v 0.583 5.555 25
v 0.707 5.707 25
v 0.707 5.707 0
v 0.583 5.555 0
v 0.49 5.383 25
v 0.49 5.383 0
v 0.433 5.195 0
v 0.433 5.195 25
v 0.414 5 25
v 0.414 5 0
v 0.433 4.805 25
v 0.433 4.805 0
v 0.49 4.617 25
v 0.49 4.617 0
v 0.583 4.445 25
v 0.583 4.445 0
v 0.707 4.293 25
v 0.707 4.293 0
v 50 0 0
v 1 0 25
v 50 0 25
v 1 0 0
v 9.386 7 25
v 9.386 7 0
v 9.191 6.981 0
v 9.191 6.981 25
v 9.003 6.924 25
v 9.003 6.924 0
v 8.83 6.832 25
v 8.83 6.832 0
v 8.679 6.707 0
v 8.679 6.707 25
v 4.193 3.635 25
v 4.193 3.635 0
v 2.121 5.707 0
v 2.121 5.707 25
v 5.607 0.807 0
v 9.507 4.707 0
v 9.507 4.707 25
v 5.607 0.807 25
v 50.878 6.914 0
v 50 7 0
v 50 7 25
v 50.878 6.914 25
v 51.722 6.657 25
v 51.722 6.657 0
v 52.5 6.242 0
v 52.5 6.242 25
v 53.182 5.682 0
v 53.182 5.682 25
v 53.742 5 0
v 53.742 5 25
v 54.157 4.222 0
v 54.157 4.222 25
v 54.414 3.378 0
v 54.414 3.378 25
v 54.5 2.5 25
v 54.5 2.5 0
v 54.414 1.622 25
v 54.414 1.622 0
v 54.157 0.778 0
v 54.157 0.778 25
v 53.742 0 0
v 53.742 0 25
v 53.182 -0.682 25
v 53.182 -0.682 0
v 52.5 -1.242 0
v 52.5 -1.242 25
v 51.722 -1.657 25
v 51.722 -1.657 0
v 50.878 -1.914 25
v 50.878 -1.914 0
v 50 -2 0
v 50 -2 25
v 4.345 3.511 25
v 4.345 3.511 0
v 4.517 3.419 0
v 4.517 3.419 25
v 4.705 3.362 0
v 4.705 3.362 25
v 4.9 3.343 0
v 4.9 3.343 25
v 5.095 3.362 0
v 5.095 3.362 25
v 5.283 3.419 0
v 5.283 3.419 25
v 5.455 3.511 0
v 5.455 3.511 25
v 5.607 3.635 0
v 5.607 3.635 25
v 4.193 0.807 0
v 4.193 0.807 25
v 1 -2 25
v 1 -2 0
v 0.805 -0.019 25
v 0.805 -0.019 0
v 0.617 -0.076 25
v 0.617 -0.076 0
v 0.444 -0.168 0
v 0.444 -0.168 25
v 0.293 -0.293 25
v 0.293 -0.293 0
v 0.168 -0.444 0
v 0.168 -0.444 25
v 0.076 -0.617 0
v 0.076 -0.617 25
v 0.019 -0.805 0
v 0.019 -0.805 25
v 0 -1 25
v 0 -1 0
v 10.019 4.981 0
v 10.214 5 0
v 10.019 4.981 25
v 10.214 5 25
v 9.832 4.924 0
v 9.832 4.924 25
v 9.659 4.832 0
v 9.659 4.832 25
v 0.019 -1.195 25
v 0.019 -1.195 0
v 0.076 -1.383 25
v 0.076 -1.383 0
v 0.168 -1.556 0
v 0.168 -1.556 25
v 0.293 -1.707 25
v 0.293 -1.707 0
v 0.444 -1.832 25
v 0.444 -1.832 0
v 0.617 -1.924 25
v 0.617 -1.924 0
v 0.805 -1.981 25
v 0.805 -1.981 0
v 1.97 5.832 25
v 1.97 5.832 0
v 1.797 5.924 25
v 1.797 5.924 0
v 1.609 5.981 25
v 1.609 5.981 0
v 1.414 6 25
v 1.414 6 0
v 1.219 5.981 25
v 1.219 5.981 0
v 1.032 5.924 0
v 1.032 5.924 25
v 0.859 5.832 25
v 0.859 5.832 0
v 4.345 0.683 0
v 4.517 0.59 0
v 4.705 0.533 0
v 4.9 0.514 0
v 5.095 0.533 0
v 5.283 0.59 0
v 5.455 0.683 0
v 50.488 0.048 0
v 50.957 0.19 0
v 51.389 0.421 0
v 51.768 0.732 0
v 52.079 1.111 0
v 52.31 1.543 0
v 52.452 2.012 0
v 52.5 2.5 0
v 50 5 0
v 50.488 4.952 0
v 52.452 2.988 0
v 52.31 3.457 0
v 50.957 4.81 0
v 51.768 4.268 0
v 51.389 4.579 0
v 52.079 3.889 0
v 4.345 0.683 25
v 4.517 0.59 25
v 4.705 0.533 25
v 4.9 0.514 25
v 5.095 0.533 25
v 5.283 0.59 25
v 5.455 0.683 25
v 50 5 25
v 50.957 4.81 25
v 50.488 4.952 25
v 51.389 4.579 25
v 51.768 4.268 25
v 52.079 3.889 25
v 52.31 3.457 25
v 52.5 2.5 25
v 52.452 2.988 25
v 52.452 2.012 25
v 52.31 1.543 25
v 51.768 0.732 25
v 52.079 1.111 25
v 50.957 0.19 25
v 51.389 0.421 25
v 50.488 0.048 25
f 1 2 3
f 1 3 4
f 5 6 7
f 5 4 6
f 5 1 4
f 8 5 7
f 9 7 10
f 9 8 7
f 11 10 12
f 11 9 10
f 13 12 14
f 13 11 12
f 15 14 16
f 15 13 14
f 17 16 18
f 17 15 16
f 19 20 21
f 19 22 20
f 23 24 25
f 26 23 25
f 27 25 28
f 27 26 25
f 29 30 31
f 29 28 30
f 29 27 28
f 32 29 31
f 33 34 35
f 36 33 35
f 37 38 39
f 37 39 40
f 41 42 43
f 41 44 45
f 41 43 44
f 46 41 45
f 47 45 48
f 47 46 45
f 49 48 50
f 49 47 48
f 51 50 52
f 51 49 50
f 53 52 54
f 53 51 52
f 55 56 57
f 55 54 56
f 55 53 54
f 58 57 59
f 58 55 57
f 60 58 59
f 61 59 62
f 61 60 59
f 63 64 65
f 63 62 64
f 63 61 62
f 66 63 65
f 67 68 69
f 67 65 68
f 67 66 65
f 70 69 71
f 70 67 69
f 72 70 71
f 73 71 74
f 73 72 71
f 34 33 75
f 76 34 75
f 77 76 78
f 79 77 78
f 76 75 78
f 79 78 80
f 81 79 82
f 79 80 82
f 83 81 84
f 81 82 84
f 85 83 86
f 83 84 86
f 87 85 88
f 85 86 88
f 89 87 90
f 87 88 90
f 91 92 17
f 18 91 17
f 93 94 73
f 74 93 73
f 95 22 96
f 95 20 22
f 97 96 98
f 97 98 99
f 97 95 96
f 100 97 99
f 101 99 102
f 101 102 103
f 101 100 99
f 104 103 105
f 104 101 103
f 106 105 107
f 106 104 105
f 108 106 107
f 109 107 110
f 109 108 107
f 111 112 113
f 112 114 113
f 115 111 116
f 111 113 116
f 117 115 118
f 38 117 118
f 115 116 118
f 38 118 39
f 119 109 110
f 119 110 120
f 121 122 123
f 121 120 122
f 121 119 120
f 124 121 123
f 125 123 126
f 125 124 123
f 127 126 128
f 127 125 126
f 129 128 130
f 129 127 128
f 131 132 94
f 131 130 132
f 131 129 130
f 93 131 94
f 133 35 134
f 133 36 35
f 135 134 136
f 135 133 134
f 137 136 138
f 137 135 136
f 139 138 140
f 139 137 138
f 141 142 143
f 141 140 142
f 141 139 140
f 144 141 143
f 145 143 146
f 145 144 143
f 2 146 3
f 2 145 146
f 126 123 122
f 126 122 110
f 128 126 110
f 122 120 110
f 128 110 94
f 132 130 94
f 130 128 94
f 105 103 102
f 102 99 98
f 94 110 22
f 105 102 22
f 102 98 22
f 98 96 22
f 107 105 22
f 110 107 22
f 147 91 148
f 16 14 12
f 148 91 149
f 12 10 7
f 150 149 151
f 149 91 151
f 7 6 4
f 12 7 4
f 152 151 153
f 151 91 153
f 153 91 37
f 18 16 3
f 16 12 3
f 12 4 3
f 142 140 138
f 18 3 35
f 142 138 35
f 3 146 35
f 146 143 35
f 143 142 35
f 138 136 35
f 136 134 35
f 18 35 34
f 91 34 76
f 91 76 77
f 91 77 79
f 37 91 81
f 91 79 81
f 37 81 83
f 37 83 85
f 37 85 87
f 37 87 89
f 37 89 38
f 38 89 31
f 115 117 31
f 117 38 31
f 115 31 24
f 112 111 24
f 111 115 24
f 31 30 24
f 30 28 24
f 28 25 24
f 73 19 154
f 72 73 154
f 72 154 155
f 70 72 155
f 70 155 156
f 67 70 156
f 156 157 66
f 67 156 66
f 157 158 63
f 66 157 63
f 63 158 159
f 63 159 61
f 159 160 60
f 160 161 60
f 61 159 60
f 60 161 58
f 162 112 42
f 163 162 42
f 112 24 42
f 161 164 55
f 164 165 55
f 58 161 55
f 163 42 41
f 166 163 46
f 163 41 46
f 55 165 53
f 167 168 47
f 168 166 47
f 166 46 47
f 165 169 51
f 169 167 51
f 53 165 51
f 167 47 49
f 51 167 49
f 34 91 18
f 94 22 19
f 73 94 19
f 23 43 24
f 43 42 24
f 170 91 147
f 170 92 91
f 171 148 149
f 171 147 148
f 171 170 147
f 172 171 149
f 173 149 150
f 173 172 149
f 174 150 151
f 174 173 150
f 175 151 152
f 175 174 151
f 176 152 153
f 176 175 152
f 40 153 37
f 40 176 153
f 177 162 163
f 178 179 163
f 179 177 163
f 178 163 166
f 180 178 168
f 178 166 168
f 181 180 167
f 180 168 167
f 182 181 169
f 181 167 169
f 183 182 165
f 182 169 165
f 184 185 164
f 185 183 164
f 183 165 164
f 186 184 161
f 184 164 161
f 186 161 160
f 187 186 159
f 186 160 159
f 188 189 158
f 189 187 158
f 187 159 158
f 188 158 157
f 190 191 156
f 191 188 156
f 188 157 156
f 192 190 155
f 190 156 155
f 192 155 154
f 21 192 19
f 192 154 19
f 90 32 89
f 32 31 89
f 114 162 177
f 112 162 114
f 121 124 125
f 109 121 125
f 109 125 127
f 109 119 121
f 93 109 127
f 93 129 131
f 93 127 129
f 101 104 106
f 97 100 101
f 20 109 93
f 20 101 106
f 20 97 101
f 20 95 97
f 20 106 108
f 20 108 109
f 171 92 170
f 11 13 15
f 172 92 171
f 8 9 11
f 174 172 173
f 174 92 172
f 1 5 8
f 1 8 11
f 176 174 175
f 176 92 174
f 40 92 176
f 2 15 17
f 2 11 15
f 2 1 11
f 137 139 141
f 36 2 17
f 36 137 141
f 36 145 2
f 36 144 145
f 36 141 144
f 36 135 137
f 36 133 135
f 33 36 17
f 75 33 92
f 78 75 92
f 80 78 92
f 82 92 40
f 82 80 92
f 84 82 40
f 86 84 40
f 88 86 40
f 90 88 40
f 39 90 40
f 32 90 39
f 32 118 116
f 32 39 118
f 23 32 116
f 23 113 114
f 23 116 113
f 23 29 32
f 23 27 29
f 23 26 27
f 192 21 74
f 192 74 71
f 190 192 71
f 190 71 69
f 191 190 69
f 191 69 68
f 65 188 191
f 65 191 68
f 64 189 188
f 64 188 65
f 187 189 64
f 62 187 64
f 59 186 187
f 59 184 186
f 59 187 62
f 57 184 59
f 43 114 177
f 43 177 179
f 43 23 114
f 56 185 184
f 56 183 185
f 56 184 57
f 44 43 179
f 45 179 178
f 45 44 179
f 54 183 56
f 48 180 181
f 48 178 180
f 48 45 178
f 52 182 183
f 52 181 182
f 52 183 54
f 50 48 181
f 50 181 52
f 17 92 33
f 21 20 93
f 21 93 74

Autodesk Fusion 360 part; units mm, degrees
sketch "Sketch1" plane through (0, 0, 0) normal (0, 0, 1) x (1, 0, 0)
  line L0 (0, 0) -> (50, 0)
  arc A0 (50, 0) -> (50, 5) centre (50, 2.5) ccw
  line L1 (50, 5) -> (9.8, 5)
  line L2 (9.8, 5) -> (4.9, 0.1)
  line L3 (4.9, 0.1) -> (0, 5)
  line L4 (0, -2) -> (50, -2)
  arc A1 (50, -2) -> (50, 7) centre (50, 2.5) ccw
  line L5 (50, 7) -> (8.9716, 7)
  line L6 (8.9716, 7) -> (4.9, 2.9284)
  line L7 (4.9, 2.9284) -> (1.4142, 6.4142)
  line L8 (0, -2) -> (0, 0)
  line L9 (0, 5) -> (1.4142, 6.4142)
  dimension "d4" = 135
  dimension "d5" = 50
  dimension "d6" = 5
  dimension "d8" = 0.1
extrude "Extrude1" add sketch "Sketch1" along normal blind 25
fillet "Fillet1" radius 1 8 edges at (4.9, 2.9284, 12.5) (4.9, 0.1, 12.5) (9.8, 5, 12.5) (8.9716, 7, 12.5) (1.4142, 6.4142, 12.5) (0, 5, 12.5) (0, -2, 12.5) (0, 0, 12.5)
